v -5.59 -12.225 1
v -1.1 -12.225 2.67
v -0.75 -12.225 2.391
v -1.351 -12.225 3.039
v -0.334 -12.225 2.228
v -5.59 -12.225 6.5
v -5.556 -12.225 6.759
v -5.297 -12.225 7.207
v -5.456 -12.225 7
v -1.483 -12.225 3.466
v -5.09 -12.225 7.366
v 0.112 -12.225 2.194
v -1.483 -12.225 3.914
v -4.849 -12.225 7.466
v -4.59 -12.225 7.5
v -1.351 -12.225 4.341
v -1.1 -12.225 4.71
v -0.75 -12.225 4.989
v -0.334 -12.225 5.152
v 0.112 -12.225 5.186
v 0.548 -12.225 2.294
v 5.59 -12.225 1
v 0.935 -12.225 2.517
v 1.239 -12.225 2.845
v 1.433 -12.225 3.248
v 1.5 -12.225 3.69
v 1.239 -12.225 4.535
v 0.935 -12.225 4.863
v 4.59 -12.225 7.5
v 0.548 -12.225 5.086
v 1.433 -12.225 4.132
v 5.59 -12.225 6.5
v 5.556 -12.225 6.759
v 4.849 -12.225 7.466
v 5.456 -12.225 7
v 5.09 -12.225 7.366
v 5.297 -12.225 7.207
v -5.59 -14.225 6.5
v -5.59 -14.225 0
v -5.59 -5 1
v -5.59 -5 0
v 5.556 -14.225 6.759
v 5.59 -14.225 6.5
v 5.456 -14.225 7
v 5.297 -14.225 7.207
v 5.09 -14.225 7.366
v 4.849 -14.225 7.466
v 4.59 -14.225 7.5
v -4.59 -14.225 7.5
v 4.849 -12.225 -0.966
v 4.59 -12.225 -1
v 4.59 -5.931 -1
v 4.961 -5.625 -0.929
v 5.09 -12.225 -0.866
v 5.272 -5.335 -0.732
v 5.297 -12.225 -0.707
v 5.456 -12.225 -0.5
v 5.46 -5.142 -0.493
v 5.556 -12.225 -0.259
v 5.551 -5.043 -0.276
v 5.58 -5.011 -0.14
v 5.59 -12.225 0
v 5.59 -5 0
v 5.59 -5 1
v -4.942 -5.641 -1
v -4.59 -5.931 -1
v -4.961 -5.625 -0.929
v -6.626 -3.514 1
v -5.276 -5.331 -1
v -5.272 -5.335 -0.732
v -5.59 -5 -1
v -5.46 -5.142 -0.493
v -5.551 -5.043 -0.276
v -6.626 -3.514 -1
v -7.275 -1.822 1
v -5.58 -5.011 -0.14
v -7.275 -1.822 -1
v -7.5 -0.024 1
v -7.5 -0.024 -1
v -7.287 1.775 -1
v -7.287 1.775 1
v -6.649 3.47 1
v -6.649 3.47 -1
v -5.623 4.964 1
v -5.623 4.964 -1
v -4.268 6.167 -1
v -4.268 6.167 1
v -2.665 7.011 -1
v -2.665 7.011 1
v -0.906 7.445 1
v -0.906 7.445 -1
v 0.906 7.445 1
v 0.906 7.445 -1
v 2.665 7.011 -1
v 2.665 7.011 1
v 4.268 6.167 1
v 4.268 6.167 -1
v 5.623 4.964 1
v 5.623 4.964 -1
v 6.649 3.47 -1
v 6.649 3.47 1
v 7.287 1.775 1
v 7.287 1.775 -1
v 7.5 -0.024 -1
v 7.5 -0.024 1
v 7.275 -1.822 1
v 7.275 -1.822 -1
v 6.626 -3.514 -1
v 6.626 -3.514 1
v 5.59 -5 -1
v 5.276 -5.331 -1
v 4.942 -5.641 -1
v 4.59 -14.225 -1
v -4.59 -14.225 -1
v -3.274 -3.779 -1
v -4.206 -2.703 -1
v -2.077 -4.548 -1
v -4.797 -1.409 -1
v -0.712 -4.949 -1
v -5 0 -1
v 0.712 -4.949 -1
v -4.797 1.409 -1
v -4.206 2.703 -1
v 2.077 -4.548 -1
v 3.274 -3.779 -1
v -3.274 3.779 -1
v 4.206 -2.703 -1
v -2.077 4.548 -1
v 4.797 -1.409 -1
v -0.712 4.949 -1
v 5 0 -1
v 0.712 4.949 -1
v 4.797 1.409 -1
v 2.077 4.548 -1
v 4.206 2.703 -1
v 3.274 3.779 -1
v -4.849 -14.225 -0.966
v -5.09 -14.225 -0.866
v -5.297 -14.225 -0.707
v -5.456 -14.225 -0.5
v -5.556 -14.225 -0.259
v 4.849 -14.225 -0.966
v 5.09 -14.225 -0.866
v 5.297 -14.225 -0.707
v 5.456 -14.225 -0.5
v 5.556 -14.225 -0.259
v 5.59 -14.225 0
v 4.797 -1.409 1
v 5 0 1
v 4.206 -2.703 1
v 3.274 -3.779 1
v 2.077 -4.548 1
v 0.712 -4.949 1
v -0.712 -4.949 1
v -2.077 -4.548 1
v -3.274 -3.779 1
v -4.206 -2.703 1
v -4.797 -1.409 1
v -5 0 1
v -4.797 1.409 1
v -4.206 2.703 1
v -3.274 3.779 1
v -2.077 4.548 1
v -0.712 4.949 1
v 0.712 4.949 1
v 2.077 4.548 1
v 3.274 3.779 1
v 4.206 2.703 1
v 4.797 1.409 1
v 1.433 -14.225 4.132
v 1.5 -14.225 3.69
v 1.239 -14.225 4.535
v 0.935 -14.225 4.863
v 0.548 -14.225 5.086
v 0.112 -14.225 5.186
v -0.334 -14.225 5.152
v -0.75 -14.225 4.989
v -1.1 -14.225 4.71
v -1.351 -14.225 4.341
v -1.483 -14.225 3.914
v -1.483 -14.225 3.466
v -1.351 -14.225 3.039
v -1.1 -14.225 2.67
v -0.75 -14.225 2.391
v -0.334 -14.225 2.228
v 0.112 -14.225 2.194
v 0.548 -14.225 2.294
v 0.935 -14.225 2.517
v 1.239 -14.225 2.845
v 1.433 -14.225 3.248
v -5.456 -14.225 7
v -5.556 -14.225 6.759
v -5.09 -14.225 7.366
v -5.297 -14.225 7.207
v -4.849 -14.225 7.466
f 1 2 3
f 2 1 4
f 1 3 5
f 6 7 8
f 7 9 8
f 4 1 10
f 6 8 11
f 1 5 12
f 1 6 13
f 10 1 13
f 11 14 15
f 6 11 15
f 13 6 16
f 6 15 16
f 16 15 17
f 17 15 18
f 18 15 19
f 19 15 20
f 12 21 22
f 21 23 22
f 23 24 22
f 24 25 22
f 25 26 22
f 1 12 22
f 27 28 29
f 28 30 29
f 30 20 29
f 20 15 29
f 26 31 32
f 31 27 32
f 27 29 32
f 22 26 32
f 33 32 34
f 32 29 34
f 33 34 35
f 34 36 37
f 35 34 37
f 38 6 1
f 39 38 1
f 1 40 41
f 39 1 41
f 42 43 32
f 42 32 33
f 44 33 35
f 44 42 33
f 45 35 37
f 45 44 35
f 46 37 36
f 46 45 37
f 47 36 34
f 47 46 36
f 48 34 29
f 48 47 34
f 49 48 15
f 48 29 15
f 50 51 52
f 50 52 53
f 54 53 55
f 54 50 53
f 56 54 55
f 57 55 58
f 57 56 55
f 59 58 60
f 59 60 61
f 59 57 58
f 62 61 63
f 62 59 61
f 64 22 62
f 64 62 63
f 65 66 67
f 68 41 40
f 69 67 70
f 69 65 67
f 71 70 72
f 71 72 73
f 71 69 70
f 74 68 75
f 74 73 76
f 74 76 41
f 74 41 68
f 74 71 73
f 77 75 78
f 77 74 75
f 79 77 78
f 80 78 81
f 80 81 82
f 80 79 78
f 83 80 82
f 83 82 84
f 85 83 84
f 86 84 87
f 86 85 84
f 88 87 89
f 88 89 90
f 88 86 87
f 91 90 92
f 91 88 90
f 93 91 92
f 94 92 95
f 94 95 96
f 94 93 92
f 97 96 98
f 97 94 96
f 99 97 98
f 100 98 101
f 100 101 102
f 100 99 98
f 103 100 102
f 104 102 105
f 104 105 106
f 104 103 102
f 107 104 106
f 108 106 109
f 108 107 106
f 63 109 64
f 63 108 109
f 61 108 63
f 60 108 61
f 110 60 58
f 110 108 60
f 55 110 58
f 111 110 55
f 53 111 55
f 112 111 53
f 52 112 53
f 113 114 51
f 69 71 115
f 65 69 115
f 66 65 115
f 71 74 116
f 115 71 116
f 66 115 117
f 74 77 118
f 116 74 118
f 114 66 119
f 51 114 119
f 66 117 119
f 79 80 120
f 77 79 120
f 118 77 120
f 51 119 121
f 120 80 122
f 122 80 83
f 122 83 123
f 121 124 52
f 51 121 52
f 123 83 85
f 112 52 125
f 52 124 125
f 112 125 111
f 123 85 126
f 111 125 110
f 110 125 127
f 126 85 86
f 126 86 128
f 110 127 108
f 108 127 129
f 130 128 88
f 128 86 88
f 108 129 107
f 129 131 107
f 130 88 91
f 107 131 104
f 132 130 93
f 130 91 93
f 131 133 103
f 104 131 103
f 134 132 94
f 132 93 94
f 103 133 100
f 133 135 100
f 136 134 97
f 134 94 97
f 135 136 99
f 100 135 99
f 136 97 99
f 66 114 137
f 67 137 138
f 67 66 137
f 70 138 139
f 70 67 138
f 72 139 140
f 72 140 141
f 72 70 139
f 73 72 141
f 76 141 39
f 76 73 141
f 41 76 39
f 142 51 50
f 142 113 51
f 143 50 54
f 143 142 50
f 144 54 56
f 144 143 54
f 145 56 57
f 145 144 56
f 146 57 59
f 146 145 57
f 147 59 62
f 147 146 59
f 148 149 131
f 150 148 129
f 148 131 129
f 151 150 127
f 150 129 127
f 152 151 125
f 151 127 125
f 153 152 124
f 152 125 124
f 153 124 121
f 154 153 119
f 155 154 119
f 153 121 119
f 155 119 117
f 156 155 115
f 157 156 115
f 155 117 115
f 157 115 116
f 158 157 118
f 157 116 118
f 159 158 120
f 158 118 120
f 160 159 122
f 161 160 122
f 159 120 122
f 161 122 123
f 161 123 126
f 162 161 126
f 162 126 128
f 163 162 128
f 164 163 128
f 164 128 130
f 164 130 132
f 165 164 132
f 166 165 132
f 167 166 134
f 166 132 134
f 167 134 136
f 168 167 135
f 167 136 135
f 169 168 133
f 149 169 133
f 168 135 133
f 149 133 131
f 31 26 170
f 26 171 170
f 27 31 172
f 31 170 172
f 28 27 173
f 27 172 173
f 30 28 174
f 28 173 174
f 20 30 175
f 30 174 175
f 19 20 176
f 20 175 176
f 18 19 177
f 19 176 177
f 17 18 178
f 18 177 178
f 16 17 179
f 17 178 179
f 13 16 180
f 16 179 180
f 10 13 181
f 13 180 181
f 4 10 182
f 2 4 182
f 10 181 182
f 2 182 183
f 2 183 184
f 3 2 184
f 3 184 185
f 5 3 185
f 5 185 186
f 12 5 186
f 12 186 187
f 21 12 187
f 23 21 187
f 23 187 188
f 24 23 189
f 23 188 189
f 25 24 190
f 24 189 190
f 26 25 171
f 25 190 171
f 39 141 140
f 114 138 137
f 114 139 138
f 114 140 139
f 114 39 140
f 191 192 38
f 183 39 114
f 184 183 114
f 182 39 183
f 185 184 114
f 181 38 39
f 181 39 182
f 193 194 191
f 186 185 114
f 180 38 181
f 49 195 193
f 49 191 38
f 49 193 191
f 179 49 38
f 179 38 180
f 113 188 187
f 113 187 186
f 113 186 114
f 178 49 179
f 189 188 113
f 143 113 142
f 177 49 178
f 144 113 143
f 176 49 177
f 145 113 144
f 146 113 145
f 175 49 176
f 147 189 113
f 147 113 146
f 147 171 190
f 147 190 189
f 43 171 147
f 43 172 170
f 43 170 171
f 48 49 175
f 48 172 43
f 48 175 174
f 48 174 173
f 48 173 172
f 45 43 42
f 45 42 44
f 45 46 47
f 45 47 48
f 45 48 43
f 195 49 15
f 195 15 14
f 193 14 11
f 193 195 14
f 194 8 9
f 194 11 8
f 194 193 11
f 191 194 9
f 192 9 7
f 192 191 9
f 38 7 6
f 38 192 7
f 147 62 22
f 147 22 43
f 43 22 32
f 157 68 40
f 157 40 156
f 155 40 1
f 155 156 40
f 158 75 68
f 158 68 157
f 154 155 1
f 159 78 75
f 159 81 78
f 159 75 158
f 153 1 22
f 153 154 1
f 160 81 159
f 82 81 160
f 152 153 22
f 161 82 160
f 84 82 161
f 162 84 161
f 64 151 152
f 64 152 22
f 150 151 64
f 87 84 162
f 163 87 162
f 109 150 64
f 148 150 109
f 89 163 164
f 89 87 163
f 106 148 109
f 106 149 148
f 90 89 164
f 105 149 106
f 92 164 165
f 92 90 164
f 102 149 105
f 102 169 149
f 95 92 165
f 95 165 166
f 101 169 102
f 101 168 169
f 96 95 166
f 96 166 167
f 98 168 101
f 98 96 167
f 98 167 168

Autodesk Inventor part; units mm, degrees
ref_plane "YZ Plane" through (0, 0, 0) normal (1, 0, 0) x (0, 1, 0)
ref_plane "XZ Plane" through (0, 0, 0) normal (0, 1, 0) x (-1, 0, 0)
ref_plane "XY Plane" through (0, 0, 0) normal (0, 0, 1) x (1, 0, 0)
sketch "Sketch1" plane through (0, 0, 0) normal (0, 0, 1) x (1, 0, 0)
  circle A0 centre (0, 0) radius 4.85 projected
  circle A1 centre (0, 0) radius 5
  circle A2 centre (0, 0) radius 7.5
  dimension "d0" = 10
  dimension "d1" = 15
extrude "Extrusion1" add sketch "Sketch1" along normal mid plane 2 contours A2
sketch "Sketch2" plane through (0, 0, 1) normal (0, 0, 1) x (1, 0, 0)
  circle A0 centre (0, 0) radius 7.5 projected
  line L0 (-5.5902, -5) -> (0, -5)
  line L1 (0, -5) -> (0, -7.5)
  line L2 (-5.5902, -7.5) -> (-5.5902, -5)
  circle A1 centre (0, 0) radius 7.5
  line L3 (5.5902, -5) -> (0, -5)
  line L4 (5.5902, -7.5) -> (5.5902, -5)
  line L5 (3.3913, -9.725) -> (-18.205, -9.725) projected
  line L6 (-5.5902, -7.5) -> (-5.5902, -9.725)
  line L7 (5.5902, -9.725) -> (5.5902, -7.5)
  line L8 (5.5902, -9.725) -> (5.5902, -12.225)
  line L9 (5.5902, -12.225) -> (-5.5902, -12.225)
  line L10 (-5.5902, -12.225) -> (-5.5902, -9.725)
  dimension "d13" = 2.5
extrude "Extrusion2" add sketch "Sketch2" against normal blind 2 contours A0 L4 L7 L8 L9 L10 L6 L2 | A0 L1 L3
sketch "Sketch5" plane through (-5.5902, -12.225, 1) normal (0, -1, 0) x (1, 0, 0)
  line L0 (11.1803, -2) -> (11.1803, 6.5)
  line L1 (11.1803, 6.5) -> (0, 6.5)
  line L2 (0, 6.5) -> (0, -2)
  line L3 (0, -2) -> (11.1803, -2)
  line L4 (11.1803, -2) -> (11.1803, 6.5)
  point P0 (5.5902, -1)
  dimension "d14" = 8.5
extrude "Extrusion5" add sketch "Sketch5" along normal blind 2
sketch "Sketch6" plane through (-5.5902, -14.225, 1) normal (0, -1, 0) x (1, 0, 0)
  line L0 (11.1803, 6.5) -> (0, 6.5) projected
  line L1 (5.5902, 6.5) -> (5.5902, 2.69)
  circle A0 centre (5.5902, 2.69) radius 1.5
  point P0 (5.5902, -1)
  dimension "d17" = 3.81
  dimension "d18" = 3
extrude "Extrusion6" cut sketch "Sketch6" against normal blind 2
fillet "Fillet1" radius 1 4 edges at (5.5902, -13.225, 7.5) (-5.5902, -13.225, 7.5) (5.5902, -9.6125, -1) (-5.5902, -9.6125, -1)
properties part number "SyringeTailConnector"
